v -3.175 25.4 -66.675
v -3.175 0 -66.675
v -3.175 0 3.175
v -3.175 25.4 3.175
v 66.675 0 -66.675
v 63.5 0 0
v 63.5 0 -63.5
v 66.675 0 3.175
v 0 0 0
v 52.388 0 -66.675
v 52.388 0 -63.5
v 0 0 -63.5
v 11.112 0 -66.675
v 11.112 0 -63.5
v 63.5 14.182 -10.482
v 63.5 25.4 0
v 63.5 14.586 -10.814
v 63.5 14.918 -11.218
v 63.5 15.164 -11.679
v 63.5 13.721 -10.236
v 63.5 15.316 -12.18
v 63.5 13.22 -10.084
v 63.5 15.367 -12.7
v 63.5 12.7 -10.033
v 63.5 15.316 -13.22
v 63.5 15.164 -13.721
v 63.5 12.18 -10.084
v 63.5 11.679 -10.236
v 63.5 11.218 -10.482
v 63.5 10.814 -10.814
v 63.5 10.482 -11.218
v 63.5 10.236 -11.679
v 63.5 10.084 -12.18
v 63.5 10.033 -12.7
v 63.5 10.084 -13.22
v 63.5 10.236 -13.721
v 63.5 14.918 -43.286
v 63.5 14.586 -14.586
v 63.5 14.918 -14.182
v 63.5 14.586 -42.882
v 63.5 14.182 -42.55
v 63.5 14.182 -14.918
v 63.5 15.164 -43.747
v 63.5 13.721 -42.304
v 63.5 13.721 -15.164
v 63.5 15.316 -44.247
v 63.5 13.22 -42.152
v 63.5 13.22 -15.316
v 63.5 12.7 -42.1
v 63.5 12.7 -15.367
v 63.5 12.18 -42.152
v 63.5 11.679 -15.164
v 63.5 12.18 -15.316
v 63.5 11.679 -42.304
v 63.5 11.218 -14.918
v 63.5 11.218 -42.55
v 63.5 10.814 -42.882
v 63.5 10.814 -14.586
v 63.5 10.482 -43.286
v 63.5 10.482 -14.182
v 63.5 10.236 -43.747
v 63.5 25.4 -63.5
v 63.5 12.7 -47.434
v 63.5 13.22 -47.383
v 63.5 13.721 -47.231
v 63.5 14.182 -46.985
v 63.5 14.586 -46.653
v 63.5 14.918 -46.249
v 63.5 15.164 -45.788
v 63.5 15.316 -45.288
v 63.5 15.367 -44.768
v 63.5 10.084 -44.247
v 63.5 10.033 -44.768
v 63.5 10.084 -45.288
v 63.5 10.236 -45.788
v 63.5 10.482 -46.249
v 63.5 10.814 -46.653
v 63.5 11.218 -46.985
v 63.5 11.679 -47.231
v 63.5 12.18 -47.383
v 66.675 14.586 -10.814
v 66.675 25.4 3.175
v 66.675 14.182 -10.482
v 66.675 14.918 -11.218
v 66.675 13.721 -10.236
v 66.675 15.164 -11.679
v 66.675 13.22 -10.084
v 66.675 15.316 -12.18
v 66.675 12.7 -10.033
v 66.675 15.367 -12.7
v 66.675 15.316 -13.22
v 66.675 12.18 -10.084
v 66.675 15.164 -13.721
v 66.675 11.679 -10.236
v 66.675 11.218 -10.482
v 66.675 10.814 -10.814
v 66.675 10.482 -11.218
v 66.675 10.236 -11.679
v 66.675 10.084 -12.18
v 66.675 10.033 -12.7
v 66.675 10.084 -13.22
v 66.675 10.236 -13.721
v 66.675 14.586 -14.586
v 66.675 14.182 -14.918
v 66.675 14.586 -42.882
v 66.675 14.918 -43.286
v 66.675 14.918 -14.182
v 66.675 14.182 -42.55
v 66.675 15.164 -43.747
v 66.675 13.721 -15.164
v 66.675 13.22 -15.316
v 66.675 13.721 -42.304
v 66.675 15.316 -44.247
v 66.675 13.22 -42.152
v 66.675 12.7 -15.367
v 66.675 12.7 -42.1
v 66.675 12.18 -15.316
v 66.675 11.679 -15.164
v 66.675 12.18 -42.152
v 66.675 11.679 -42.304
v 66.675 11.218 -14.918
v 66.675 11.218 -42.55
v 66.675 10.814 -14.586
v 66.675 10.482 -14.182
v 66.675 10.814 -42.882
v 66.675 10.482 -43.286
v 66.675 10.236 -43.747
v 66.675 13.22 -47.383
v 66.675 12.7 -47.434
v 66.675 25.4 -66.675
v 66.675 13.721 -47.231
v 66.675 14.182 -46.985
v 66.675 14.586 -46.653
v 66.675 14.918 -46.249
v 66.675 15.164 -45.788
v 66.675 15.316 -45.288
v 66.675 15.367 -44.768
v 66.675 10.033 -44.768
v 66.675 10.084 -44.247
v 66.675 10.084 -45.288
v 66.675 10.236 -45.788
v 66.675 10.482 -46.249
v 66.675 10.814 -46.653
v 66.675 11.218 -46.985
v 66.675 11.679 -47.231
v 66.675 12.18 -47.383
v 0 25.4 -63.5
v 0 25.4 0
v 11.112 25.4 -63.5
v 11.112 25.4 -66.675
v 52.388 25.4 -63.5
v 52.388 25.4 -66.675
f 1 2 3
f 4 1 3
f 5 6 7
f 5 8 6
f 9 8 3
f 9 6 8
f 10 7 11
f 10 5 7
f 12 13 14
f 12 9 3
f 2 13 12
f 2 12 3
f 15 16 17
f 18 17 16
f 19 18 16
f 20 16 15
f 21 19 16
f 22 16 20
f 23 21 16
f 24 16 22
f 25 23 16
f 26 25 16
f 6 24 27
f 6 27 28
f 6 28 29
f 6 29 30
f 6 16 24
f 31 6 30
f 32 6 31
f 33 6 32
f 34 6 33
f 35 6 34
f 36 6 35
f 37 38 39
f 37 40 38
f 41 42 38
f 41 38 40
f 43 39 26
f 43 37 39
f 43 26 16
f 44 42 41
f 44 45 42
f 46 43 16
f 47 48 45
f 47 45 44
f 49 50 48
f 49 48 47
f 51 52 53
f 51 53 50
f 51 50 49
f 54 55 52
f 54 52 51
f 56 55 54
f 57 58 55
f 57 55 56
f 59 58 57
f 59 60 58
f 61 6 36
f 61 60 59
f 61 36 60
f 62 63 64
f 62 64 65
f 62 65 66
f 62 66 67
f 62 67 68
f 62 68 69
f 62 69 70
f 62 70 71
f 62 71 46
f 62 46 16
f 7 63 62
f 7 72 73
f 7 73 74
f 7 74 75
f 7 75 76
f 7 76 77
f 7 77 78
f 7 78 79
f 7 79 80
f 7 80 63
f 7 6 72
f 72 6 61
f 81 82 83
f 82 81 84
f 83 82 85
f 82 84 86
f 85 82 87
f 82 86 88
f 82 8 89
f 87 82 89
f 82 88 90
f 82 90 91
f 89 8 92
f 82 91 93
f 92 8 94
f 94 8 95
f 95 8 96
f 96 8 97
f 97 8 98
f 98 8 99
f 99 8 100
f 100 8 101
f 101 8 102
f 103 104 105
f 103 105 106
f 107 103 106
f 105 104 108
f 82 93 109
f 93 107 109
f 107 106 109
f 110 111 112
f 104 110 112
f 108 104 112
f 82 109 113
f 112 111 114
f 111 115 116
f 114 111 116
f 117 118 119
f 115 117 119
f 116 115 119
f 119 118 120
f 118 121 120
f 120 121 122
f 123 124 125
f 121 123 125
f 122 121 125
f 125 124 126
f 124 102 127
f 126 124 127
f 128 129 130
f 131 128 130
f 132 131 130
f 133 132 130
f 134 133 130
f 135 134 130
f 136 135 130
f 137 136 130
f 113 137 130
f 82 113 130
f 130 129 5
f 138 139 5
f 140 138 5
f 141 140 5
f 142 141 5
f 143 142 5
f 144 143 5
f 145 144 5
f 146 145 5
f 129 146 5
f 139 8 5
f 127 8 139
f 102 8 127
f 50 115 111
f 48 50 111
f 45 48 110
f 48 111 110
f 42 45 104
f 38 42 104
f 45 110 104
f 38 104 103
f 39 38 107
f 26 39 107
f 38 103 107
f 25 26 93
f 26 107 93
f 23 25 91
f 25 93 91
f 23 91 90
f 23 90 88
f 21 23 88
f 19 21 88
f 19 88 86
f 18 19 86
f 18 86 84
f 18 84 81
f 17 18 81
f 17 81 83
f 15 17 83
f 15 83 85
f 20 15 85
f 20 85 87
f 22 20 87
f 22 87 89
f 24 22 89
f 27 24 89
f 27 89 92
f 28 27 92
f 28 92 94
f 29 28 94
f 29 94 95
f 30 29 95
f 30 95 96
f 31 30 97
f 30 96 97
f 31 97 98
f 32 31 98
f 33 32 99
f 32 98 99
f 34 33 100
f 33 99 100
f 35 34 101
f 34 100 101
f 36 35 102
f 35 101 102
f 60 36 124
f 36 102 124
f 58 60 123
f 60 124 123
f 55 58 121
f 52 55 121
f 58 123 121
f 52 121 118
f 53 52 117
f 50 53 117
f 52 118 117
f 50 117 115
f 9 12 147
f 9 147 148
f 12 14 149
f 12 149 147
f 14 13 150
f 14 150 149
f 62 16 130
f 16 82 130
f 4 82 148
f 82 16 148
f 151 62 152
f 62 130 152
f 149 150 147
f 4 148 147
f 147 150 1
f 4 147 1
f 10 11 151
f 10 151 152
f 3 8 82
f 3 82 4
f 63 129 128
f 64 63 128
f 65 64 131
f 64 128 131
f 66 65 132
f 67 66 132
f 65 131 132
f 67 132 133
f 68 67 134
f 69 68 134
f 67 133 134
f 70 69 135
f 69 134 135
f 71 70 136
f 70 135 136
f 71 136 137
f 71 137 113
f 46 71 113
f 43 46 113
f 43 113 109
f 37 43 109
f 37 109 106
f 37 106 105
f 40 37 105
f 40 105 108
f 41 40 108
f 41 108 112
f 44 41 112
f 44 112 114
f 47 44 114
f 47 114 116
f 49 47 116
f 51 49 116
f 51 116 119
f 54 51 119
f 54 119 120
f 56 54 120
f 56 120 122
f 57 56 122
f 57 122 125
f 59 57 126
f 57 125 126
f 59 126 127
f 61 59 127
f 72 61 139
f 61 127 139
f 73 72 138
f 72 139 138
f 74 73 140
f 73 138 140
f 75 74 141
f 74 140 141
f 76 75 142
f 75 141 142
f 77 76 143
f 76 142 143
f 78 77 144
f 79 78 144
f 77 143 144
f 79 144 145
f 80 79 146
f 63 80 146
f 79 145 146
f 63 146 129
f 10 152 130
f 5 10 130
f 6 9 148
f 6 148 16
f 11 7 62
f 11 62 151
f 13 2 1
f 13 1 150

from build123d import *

# Parameters (mm, degrees)
BOSS_EXTRUDE1_DEPTH = 25.4
CUT_EXTRUDE1_REACH  = 71.85
SKETCH2_R           = 2.667


with BuildPart() as part:
    # Sketch1 → Boss-Extrude1 (new body)
    with BuildSketch(Plane(origin=(0, 0, 0), x_dir=(1, 0, 0), z_dir=(0, 1, 0))):
        Polygon((-3.175, -3.175), (-3.175, 63.5), (-3.175, 66.675), (11.1125, 66.675), (11.1125, 63.5), (0, 63.5), (0, 0), (63.5, 0), (63.5, 63.5), (52.3875, 63.5), (52.3875, 66.675), (66.675, 66.675), (66.675, 63.5), (66.675, -3.175), align=None)
    extrude(amount=BOSS_EXTRUDE1_DEPTH)

    # Sketch2 → Cut-Extrude1 (cut, up to next)
    with BuildSketch(Plane(origin=(66.675, 0, 0), x_dir=(0, 0, -1), z_dir=(1, 0, 0)), mode=Mode.PRIVATE) as cut_extrude1_sk1:
        with Locations((12.7, 12.7)):
            Circle(SKETCH2_R)
    cut_extrude1_tool1 = extrude(cut_extrude1_sk1.sketch, amount=-CUT_EXTRUDE1_REACH, mode=Mode.PRIVATE) & part.part
    add(cut_extrude1_tool1.solids().sort_by_distance((66.675, 12.7, -12.7))[0], mode=Mode.SUBTRACT)
    # Sketch2 → Cut-Extrude1 (cut, up to next)
    with BuildSketch(Plane(origin=(66.675, 0, 0), x_dir=(0, 0, -1), z_dir=(1, 0, 0)), mode=Mode.PRIVATE) as cut_extrude1_sk2:
        with Locations((44.7675, 12.7)):
            Circle(SKETCH2_R)
    cut_extrude1_tool2 = extrude(cut_extrude1_sk2.sketch, amount=-CUT_EXTRUDE1_REACH, mode=Mode.PRIVATE) & part.part
    add(cut_extrude1_tool2.solids().sort_by_distance((66.675, 12.7, -44.7675))[0], mode=Mode.SUBTRACT)


solid = part.part
